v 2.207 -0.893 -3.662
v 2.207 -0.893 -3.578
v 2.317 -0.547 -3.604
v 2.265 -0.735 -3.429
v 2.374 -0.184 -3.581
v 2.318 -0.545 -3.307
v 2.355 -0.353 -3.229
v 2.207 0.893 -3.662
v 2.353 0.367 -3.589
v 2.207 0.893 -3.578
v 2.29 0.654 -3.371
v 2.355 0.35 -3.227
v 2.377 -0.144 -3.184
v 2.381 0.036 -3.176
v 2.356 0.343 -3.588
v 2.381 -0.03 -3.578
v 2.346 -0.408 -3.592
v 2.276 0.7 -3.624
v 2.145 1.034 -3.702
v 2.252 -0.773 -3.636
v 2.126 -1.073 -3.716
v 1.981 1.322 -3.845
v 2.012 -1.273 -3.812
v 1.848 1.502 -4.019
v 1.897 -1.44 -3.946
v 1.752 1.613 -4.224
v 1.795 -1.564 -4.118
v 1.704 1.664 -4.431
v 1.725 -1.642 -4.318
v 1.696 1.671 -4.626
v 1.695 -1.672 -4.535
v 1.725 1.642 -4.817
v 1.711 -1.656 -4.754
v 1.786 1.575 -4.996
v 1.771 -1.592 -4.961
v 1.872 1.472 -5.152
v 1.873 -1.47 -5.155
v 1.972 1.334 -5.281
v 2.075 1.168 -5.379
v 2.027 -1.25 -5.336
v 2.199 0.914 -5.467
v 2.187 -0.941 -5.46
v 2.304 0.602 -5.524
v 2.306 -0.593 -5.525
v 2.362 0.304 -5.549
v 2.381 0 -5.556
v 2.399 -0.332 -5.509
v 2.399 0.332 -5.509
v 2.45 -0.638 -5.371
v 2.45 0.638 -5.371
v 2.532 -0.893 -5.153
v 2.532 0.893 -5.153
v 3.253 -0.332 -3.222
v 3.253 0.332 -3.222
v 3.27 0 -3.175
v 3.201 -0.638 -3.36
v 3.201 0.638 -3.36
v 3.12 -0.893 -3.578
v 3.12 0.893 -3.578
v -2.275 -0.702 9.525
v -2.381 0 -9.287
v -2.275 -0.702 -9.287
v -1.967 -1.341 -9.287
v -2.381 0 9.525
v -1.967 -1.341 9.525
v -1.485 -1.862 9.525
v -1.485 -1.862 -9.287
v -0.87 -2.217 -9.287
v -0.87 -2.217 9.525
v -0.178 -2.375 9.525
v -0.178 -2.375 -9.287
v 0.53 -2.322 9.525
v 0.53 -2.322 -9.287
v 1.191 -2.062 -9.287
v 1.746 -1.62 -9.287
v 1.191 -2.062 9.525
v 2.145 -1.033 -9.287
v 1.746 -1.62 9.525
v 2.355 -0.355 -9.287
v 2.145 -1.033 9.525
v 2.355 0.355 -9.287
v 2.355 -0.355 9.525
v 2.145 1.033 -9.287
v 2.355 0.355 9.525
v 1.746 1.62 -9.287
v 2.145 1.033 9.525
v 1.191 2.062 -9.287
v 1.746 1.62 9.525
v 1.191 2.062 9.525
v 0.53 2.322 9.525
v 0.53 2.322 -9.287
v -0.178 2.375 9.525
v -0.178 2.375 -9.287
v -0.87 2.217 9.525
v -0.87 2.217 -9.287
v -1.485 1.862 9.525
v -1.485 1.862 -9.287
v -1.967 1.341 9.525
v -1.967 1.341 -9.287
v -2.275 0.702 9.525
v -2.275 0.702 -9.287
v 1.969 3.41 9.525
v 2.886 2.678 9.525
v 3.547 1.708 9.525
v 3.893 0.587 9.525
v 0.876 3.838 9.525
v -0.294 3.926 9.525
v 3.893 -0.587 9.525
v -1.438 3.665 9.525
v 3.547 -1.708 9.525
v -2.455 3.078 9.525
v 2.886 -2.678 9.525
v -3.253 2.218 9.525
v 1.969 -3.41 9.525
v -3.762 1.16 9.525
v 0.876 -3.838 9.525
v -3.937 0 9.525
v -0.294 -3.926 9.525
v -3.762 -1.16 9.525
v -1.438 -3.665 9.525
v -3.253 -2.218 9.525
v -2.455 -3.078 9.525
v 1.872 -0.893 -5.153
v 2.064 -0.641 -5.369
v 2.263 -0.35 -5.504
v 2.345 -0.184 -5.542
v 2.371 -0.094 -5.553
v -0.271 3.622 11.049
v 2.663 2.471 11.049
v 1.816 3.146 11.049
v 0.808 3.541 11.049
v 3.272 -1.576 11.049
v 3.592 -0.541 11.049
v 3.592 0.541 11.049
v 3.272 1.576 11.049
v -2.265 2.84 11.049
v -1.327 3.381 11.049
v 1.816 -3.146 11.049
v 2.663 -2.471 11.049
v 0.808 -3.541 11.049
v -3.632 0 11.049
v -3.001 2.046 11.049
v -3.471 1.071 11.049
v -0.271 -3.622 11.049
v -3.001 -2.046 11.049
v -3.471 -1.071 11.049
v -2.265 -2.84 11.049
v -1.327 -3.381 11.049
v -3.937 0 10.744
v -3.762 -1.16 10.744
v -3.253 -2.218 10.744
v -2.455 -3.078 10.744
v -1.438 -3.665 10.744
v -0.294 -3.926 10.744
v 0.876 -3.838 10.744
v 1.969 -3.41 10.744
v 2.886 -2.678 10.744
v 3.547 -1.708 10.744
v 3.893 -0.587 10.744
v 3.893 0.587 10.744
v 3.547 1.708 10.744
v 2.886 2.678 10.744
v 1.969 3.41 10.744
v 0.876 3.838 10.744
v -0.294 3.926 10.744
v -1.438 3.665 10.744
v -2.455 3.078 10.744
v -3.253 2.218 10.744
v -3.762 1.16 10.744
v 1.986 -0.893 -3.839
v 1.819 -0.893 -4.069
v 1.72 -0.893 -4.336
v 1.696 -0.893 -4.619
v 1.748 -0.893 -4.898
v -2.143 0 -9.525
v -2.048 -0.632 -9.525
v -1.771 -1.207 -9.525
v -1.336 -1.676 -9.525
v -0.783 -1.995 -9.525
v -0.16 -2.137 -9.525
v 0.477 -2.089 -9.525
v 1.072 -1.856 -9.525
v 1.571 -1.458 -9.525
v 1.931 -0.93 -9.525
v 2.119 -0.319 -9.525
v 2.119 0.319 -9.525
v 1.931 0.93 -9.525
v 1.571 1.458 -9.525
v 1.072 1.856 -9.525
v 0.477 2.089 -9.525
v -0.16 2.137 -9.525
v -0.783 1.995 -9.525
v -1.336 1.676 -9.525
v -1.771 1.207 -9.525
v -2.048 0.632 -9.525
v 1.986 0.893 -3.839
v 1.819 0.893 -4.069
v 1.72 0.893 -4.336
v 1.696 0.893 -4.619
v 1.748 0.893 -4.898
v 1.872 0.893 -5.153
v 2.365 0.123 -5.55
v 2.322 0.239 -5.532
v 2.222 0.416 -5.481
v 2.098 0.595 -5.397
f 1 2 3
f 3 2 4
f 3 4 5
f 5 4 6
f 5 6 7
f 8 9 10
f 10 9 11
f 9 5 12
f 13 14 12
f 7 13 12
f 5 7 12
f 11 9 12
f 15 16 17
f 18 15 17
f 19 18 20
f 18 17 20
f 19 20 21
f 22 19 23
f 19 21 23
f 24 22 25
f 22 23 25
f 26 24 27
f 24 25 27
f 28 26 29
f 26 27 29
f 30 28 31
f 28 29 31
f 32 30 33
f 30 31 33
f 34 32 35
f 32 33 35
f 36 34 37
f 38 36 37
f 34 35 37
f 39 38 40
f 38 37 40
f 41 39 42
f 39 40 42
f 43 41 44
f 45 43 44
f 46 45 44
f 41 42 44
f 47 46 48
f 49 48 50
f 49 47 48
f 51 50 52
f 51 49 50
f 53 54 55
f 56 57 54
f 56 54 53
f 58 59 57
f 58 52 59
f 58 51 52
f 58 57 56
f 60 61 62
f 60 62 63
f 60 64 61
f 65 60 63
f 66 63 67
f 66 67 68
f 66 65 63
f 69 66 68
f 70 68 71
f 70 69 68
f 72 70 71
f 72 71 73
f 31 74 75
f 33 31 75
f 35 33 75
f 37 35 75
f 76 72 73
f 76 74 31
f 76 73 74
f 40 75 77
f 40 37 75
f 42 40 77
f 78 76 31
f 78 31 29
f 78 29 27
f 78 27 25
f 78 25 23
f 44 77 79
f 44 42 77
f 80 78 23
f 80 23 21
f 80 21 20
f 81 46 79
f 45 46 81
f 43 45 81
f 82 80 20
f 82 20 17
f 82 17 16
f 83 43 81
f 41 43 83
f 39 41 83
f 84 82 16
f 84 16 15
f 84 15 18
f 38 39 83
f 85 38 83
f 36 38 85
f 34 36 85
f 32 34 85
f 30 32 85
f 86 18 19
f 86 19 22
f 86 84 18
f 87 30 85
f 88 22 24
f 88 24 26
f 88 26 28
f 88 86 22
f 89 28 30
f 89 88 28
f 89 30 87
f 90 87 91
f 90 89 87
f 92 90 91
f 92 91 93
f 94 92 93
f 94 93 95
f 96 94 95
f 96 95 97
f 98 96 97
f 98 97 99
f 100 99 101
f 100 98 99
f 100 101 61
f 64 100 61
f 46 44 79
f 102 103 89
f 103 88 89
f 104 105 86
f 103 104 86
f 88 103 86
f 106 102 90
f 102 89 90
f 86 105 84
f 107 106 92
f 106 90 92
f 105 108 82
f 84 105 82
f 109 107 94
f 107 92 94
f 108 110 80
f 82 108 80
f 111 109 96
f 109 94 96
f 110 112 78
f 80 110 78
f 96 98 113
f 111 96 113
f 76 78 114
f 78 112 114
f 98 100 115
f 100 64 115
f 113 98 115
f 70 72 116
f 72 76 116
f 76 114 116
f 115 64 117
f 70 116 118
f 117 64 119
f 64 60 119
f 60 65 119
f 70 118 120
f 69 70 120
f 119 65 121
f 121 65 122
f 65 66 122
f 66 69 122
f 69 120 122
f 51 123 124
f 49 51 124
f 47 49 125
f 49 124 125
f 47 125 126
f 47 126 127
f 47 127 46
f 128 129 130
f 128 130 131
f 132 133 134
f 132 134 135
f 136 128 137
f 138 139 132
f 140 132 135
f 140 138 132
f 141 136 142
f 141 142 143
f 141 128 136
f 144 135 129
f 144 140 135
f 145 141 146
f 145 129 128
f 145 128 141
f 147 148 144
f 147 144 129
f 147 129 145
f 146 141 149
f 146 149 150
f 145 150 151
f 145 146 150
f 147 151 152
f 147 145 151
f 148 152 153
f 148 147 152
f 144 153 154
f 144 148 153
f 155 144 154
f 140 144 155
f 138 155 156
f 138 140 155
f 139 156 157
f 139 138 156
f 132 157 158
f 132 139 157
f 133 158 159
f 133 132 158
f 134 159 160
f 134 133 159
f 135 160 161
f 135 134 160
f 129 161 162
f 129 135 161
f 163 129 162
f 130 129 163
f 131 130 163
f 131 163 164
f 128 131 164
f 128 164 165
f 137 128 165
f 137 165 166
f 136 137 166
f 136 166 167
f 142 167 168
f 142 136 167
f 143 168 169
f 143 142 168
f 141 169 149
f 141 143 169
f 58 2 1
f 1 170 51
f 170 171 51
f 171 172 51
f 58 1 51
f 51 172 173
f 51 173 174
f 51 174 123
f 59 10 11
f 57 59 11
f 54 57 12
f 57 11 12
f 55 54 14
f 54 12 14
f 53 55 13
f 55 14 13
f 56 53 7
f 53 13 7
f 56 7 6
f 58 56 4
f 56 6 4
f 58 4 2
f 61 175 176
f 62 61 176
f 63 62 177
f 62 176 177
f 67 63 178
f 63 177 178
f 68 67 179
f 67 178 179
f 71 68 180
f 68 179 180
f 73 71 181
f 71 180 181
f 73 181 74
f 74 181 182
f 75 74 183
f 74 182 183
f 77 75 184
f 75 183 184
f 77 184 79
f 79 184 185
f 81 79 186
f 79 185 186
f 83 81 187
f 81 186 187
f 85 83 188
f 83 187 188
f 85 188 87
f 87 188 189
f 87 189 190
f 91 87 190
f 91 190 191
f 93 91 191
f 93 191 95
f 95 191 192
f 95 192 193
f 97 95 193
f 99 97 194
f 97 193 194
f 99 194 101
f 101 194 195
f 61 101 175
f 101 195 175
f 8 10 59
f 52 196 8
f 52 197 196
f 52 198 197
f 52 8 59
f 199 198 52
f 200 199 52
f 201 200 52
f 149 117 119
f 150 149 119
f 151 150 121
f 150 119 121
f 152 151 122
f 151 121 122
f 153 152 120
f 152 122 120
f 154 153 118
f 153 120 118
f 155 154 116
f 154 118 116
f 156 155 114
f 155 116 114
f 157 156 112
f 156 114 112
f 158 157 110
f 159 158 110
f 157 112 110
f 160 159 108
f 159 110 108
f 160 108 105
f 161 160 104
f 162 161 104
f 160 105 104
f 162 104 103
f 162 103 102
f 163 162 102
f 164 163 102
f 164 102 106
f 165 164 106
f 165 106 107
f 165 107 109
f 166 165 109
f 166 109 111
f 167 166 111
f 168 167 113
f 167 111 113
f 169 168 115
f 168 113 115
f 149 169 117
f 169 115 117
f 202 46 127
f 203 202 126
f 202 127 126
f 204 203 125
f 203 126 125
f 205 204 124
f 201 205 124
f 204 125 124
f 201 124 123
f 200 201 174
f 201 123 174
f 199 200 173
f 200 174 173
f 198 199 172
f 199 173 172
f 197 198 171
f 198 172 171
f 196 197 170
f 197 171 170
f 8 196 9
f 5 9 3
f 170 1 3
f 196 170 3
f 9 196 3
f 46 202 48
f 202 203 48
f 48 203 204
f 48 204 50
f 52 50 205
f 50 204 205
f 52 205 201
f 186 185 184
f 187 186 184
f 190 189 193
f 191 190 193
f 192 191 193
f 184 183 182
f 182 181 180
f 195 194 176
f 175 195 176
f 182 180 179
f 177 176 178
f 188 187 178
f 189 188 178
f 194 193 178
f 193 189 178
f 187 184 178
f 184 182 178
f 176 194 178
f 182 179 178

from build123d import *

# Parameters (mm, degrees)
SKETCH1_R               = 2.38125
EXTRUDE1_DEPTH          = 9.525
SKETCH2_R               = 3.937
EXTRUDE2_DEPTH          = 1.524
CHAMFER1_SIZE           = 0.3048
CHAMFER2_SIZE           = 0.238125
SKETCH3_R               = 1.190625
EXTRUDE5_DEPTH          = 3.27025
EXTRUDE6_DEPTH          = 13.372563962
EXTRUDE6_DEPTH_BACK     = 13.372563962
SKETCH11_W              = 2.38125
SKETCH11_H              = 1.48828125
EXTRUDE8_DEPTH          = 13.372563962
EXTRUDE7_DEPTH          = 13.372563962
EXTRUDE7_DEPTH_BACK     = 13.372563962
BODY_MOVE_COPY1_START   = -3
BODY_MOVE_COPY1_2_DEPTH = 6


with BuildPart() as part:
    # Sketch1 → Extrude1 (new, symmetric)
    with BuildSketch(Plane.XY):
        with Locations(Location((0, 0, 0), (0, 0, 180))):
            Circle(SKETCH1_R)
    extrude(amount=EXTRUDE1_DEPTH, both=True)

    # Sketch2 → Extrude2 (add)
    with BuildSketch(Plane.XY.offset(9.525)):
        with Locations(Location((0, 0, 0), (0, 0, 180))):
            Circle(SKETCH2_R)
    extrude(amount=EXTRUDE2_DEPTH)

    # Chamfer1
    chamfer1_edges = [part.edges().sort_by_distance(p)[0] for p in [
        (3.937, 0, 11.049),
    ]]
    chamfer(chamfer1_edges, length=CHAMFER1_SIZE)

    # Chamfer2
    chamfer2_edges = [part.edges().sort_by_distance(p)[0] for p in [
        (2.38125, 0, -9.525),
    ]]
    chamfer(chamfer2_edges, length=CHAMFER2_SIZE)

    # Sketch10 → Extrude7 (cut, two sides: drawn at the far end of the back side and taken through both)
    with BuildSketch(Plane(origin=(0, 0, 0), x_dir=(1, 0, 0), z_dir=(0, 1, 0)).offset(-EXTRUDE7_DEPTH_BACK)):
        with BuildLine():
            Line((2.38125, 5.55625), (2.38125, 3.578100586))
            ThreePointArc((2.38125, 3.578100586), (1.694749991, 4.567175293), (2.38125, 5.55625))
        make_face()
    extrude(amount=EXTRUDE7_DEPTH + EXTRUDE7_DEPTH_BACK, mode=Mode.SUBTRACT)


with BuildPart() as body_2:
    # Sketch3 → Extrude5 (new body)
    with BuildSketch(Plane(origin=(0, 0, 0), x_dir=(0, 0, -1), z_dir=(1, 0, 0))):
        with Locations(Location((4.365625, 0, 0), (0, 0, 180))):
            Circle(SKETCH3_R)
    extrude(amount=EXTRUDE5_DEPTH)

    # Sketch9 → Extrude6 (cut, two sides: drawn at the far end of the back side and taken through both)
    with BuildSketch(Plane(origin=(0, 0, 0), x_dir=(1, 0, 0), z_dir=(0, 1, 0)).offset(-EXTRUDE6_DEPTH_BACK)):
        Polygon((-13.544226274, 48.213775733), (2.38125, 5.55625), (3.27025, 3.175), (19.195726274, -39.482525733), (104.51077774, -7.631573186), (71.770825193, 80.064728281), align=None)
    extrude(amount=EXTRUDE6_DEPTH + EXTRUDE6_DEPTH_BACK, mode=Mode.SUBTRACT)

    # Sketch11 → Extrude8 (cut, through all)
    with BuildSketch(Plane(origin=(0, 0, 0), x_dir=(0, 0, -1), z_dir=(1, 0, 0))):
        with Locations((4.365625, 1.637109375)):
            Rectangle(SKETCH11_W, SKETCH11_H)
        with Locations((4.365625, -1.637109375)):
            Rectangle(SKETCH11_W, SKETCH11_H)
    extrude(amount=EXTRUDE8_DEPTH, mode=Mode.SUBTRACT)


with BuildPart() as body_3:
    # Body-Move/Copy1: read off the stored shape, not the designer's step
    # Body-Move/Copy1 outline → Body-Move/Copy1 (revolve)
    with BuildSketch(Plane.XZ):
        Polygon((0, 11.049), (0, -9.525), (2.143125, -9.525), (2.38125, -9.286875), (2.38125, 9.525), (3.937, 9.525), (3.937, 10.7442), (3.6322, 11.049), align=None)
    revolve(axis=Axis((0, 0, 0), (0, 0, 1)))

    # Body-Move_Copy1 2 outline → Body-Move_Copy1 2 (cut)
    with BuildSketch(Plane(origin=(0, 0, 0), x_dir=(1, 0, 0), z_dir=(0, 1, 0)).offset(BODY_MOVE_COPY1_START)):
        with BuildLine():
            Line((4, 6.160583018), (2.381250169, 5.556250063))
            ThreePointArc((2.381250169, 5.556250063), (1.694749991, 4.567175372), (2.381250021, 3.578100578))
            Line((2.381250021, 3.578100578), (4, 2.973767292))
            Line((4, 2.973767292), (4, 6.160583018))
        make_face()
    extrude(amount=BODY_MOVE_COPY1_2_DEPTH, mode=Mode.SUBTRACT)


with BuildPart() as body_2_1:
    add(body_2.part)

    # Combine1: cut body 3
    add(body_3.part, mode=Mode.SUBTRACT)


solid = Compound([part.part, body_2_1.part])
